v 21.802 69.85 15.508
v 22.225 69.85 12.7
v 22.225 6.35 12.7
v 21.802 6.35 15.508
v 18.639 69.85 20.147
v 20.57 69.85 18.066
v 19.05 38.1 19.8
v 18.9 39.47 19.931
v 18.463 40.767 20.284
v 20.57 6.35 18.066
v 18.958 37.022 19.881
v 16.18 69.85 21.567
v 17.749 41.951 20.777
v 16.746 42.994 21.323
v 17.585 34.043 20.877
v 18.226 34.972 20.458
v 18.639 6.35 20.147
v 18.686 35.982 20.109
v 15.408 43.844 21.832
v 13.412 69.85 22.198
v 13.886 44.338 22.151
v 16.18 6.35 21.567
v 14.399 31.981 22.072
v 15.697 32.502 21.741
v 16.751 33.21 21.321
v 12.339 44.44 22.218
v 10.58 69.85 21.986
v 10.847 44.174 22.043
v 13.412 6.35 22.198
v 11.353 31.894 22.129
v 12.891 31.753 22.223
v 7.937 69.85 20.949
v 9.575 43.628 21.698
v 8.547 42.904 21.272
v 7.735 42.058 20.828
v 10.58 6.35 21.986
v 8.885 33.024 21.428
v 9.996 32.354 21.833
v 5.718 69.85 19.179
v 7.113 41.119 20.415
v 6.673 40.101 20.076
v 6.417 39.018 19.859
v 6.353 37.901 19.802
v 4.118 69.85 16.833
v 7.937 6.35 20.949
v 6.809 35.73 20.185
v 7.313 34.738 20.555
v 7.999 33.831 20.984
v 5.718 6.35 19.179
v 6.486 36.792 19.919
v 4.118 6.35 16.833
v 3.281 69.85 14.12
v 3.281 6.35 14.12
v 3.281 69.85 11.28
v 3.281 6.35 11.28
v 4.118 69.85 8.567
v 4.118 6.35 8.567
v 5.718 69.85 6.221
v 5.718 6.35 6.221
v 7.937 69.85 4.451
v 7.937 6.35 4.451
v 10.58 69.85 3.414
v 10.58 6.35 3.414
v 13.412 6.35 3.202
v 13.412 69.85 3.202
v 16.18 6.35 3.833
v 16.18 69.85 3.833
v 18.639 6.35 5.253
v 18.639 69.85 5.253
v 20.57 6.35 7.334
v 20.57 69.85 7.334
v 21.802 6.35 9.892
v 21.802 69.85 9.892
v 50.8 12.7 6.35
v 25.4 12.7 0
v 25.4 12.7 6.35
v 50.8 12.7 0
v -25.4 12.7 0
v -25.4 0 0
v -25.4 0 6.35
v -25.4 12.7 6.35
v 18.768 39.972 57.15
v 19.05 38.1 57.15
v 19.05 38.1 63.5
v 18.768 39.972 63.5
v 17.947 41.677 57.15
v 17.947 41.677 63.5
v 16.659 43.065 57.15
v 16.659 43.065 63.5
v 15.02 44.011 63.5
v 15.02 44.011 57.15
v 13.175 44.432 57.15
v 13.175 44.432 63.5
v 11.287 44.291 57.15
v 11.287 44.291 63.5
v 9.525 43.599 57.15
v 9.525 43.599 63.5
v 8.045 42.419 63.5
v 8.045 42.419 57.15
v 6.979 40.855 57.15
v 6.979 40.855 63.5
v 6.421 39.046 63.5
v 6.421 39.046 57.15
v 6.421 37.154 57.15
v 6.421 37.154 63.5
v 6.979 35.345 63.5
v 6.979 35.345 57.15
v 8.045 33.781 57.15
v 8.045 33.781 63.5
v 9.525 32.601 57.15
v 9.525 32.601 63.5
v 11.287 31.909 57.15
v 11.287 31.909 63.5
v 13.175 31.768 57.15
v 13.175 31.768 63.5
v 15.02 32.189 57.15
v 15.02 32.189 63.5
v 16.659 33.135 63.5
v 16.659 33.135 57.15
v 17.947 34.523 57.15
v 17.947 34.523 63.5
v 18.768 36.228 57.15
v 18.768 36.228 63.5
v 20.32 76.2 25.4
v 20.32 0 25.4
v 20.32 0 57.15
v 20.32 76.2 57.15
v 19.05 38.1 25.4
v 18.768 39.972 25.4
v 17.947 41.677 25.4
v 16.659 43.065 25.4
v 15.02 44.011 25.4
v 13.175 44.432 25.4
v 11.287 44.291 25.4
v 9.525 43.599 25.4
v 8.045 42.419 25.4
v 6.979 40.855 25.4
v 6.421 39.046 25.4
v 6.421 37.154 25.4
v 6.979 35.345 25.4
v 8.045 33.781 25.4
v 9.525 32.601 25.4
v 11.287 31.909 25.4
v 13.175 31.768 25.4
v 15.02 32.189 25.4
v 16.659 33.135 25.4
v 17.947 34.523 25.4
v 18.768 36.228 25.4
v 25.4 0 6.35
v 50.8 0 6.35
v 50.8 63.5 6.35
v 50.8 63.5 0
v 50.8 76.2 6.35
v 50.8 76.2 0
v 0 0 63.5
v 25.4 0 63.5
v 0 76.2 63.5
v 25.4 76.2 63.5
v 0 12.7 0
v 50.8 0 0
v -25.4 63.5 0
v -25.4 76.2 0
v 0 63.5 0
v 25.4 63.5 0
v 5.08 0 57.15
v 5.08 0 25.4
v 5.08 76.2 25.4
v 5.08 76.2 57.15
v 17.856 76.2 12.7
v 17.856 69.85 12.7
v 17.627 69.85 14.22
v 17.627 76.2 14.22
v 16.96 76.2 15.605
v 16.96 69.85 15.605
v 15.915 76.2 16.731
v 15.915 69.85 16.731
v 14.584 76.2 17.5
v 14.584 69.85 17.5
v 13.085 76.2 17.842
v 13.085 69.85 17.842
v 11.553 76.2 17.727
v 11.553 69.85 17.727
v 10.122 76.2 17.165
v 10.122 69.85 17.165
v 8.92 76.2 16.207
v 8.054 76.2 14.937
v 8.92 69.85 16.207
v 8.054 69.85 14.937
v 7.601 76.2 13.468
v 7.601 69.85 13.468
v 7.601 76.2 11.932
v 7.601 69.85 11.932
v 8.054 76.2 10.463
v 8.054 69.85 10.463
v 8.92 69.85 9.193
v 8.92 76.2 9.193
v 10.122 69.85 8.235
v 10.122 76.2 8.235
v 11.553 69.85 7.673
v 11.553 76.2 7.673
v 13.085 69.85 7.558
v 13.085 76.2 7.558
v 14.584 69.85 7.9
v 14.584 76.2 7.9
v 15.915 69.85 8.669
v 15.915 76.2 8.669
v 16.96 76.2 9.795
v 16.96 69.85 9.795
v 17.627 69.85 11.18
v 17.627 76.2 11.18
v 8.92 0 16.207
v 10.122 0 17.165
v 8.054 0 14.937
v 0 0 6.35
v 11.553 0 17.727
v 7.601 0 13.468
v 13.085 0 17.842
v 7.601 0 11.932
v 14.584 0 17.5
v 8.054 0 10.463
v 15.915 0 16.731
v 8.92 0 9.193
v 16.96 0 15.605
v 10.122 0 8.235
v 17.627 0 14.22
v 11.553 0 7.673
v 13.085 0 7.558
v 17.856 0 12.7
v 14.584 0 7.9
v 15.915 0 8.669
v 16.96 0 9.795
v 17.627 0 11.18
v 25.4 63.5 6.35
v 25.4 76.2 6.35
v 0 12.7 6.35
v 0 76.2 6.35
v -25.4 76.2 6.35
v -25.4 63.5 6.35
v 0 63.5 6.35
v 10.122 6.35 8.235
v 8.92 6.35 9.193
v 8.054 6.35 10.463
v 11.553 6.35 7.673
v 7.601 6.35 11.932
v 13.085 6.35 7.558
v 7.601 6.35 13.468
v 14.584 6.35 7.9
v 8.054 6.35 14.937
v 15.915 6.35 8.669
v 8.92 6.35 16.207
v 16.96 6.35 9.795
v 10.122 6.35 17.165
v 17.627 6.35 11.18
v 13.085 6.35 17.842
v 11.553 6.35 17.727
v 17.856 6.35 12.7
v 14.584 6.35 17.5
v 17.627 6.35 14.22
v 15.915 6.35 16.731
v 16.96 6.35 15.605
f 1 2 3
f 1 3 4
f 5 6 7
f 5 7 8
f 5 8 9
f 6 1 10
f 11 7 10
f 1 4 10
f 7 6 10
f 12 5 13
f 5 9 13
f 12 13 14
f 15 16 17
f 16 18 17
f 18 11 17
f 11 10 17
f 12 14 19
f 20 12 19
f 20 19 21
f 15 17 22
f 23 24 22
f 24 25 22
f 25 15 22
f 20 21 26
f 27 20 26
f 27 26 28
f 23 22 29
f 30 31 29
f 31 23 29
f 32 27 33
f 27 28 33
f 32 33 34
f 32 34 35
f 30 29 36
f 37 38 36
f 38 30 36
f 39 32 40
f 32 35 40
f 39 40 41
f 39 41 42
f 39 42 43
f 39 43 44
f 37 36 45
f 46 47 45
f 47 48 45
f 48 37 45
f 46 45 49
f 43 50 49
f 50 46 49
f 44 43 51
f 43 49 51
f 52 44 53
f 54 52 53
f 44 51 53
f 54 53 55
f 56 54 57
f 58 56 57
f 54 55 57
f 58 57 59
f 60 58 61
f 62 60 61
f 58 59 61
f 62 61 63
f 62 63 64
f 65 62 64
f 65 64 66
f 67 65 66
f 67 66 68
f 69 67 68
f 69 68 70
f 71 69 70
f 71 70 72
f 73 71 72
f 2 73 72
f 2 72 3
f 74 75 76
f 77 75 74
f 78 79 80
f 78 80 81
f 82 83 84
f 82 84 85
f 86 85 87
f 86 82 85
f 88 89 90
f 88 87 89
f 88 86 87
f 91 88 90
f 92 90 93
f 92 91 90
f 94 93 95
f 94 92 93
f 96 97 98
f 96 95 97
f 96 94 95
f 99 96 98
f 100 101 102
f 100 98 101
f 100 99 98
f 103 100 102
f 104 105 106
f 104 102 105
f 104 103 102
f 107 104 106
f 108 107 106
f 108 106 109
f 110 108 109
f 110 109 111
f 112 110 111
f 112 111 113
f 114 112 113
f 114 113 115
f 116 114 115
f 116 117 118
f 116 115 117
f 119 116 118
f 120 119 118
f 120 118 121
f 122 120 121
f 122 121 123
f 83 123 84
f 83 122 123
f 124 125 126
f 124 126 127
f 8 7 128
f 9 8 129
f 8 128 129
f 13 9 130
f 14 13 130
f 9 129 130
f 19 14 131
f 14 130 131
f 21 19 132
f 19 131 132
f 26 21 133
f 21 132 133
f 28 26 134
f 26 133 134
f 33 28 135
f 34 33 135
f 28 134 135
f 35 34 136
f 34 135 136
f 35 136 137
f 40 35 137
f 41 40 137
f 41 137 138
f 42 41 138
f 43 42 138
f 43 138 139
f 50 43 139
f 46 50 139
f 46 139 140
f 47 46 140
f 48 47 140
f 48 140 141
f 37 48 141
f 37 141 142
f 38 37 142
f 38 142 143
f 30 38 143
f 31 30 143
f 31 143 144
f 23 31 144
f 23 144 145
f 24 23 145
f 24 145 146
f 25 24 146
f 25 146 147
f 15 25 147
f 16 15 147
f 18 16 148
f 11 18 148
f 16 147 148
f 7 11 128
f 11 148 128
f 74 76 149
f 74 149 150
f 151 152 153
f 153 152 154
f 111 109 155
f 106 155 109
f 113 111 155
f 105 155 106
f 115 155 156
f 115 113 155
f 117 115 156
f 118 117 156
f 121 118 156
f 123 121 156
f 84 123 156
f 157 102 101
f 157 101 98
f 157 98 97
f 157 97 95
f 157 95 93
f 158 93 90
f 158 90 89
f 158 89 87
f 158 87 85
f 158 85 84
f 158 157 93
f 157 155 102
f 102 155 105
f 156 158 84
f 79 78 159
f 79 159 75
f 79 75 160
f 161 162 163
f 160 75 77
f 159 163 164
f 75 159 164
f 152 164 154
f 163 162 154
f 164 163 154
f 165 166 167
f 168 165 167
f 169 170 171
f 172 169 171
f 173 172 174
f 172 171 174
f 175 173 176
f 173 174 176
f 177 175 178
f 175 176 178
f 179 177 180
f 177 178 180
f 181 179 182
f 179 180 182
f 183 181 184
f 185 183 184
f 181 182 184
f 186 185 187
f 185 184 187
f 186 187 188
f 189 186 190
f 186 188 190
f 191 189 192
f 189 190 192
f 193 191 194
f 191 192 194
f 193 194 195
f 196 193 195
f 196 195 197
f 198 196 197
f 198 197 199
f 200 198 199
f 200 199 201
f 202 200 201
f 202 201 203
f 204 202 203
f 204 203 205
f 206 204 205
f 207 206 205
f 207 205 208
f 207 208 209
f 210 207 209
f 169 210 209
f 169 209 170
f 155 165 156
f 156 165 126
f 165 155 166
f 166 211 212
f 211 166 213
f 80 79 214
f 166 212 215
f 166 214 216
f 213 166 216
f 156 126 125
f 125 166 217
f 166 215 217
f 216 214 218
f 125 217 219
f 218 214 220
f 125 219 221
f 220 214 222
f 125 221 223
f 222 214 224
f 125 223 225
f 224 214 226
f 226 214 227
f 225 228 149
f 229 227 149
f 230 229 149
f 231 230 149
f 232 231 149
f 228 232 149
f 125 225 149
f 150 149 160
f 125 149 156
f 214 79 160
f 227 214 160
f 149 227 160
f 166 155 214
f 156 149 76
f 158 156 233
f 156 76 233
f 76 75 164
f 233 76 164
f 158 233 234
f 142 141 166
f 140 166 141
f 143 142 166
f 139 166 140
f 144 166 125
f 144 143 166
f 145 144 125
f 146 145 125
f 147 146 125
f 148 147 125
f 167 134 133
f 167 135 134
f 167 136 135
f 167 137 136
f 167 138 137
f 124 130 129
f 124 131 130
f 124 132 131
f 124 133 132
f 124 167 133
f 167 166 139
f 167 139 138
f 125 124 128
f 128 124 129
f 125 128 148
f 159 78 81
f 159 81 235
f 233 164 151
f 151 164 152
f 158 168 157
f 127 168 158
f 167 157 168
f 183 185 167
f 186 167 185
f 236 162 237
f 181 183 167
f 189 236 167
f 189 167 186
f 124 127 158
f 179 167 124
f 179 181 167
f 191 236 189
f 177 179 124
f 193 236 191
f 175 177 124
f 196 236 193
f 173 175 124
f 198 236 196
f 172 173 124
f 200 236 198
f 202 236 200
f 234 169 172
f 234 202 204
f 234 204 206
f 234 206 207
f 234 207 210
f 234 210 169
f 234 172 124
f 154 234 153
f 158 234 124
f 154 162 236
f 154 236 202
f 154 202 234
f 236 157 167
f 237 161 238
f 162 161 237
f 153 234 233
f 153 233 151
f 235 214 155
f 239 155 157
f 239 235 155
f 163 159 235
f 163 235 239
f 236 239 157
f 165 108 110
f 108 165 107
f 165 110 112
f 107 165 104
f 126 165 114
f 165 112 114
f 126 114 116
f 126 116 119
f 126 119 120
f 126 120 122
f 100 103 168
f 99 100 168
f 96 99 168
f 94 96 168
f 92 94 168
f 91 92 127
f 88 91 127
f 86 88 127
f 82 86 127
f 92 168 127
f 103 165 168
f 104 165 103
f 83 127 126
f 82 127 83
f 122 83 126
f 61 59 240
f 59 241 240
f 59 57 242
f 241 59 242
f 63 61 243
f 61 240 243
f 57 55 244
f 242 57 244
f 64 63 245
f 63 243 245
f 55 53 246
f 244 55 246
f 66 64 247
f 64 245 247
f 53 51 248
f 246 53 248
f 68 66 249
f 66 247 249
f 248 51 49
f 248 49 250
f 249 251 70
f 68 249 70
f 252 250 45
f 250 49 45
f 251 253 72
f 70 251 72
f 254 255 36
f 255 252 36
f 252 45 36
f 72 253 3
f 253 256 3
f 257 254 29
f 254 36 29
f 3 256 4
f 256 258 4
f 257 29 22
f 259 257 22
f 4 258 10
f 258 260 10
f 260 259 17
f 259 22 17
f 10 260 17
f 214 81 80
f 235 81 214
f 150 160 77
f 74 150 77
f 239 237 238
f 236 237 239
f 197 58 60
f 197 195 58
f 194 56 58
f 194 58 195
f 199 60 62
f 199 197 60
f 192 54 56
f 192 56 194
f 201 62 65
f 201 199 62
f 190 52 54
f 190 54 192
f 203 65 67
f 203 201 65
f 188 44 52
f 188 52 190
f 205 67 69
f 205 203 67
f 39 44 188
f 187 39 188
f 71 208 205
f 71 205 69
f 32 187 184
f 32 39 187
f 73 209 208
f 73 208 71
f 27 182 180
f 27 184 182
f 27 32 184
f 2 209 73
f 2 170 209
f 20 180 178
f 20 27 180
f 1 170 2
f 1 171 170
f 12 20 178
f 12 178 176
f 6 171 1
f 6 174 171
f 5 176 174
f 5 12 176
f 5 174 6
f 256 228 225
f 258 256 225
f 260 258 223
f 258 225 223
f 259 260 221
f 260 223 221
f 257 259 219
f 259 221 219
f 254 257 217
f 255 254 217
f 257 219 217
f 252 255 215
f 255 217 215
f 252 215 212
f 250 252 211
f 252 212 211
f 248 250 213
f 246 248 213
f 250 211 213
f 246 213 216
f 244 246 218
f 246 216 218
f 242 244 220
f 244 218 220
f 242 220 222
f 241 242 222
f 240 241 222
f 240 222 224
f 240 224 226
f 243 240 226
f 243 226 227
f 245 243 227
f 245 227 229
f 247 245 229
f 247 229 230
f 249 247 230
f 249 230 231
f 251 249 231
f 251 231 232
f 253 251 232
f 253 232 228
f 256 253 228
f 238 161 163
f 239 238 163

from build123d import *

# Parameters (mm, degrees)
F0_W           = 25.4
F0_H           = 76.2
F1_DEPTH       = 25.4
F2_W           = 25.4
F2_H           = 12.7
F3_DEPTH       = 6.35
F5_START       = -6.35
F4_R           = 9.525
F5_DEPTH       = 63.5
F6_R           = 5.1562
F7_DEPTH       = 76.201
F9_W           = 5.08
F9_H           = 76.2
F10_DEPTH      = 38.1
F11_W          = 20.32
F11_H          = 76.2
F12_DEPTH      = 6.35
F8_R           = 6.35
F13_DEPTH      = 5.6014842716
F13_DEPTH_BACK = 38.101


with BuildPart() as f1:
    # F0 (on Top) → F1 (new body)
    with BuildSketch(Plane.XY):
        with Locations((12.7, 38.1)):
            Rectangle(F0_W, F0_H)
    extrude(amount=F1_DEPTH)

    # F2 (on Top) → F3 (join)
    with BuildSketch(Plane.XY):
        with Locations((-12.7, 6.35)):
            Rectangle(F2_W, F2_H)
        with Locations((38.1, 6.35)):
            Rectangle(F2_W, F2_H)
        with Locations((-12.7, 69.85)):
            Rectangle(F2_W, F2_H)
        with Locations((38.1, 69.85)):
            Rectangle(F2_W, F2_H)
    extrude(amount=F3_DEPTH)

    # F4 (on face) → F5 (cut)
    with BuildSketch(Plane.XZ.offset(F5_START)):
        with Locations((12.7, 12.7)):
            Circle(F4_R)
    extrude(amount=-F5_DEPTH, mode=Mode.SUBTRACT)

    # F6 (on face) → F7 (cut, through all)
    with BuildSketch(Plane.XZ):
        with Locations((12.7, 12.7)):
            Circle(F6_R)
    extrude(amount=-F7_DEPTH, mode=Mode.SUBTRACT)

    # F9 (on face) → F10 (join)
    with BuildSketch(Plane.XY.offset(25.4)):
        with Locations((22.86, 38.1)):
            Rectangle(F9_W, F9_H)
        with Locations((2.54, 38.1)):
            Rectangle(F9_W, F9_H)
    extrude(amount=F10_DEPTH)

    # F11 (on face) → F12 (join)
    with BuildSketch(Plane.XY.offset(63.5)):
        with Locations((10.16, 38.1)):
            Rectangle(F11_W, F11_H)
    extrude(amount=-F12_DEPTH)

    # F8 (on face) → F13 (cut, two sides)
    with BuildSketch(Plane.XY.offset(25.4)) as f13_sk:
        with Locations((12.7, 38.1)):
            Circle(F8_R)
    extrude(amount=-F13_DEPTH, mode=Mode.SUBTRACT)
    extrude(f13_sk.sketch, amount=F13_DEPTH_BACK, mode=Mode.SUBTRACT)


solid = f1.part
